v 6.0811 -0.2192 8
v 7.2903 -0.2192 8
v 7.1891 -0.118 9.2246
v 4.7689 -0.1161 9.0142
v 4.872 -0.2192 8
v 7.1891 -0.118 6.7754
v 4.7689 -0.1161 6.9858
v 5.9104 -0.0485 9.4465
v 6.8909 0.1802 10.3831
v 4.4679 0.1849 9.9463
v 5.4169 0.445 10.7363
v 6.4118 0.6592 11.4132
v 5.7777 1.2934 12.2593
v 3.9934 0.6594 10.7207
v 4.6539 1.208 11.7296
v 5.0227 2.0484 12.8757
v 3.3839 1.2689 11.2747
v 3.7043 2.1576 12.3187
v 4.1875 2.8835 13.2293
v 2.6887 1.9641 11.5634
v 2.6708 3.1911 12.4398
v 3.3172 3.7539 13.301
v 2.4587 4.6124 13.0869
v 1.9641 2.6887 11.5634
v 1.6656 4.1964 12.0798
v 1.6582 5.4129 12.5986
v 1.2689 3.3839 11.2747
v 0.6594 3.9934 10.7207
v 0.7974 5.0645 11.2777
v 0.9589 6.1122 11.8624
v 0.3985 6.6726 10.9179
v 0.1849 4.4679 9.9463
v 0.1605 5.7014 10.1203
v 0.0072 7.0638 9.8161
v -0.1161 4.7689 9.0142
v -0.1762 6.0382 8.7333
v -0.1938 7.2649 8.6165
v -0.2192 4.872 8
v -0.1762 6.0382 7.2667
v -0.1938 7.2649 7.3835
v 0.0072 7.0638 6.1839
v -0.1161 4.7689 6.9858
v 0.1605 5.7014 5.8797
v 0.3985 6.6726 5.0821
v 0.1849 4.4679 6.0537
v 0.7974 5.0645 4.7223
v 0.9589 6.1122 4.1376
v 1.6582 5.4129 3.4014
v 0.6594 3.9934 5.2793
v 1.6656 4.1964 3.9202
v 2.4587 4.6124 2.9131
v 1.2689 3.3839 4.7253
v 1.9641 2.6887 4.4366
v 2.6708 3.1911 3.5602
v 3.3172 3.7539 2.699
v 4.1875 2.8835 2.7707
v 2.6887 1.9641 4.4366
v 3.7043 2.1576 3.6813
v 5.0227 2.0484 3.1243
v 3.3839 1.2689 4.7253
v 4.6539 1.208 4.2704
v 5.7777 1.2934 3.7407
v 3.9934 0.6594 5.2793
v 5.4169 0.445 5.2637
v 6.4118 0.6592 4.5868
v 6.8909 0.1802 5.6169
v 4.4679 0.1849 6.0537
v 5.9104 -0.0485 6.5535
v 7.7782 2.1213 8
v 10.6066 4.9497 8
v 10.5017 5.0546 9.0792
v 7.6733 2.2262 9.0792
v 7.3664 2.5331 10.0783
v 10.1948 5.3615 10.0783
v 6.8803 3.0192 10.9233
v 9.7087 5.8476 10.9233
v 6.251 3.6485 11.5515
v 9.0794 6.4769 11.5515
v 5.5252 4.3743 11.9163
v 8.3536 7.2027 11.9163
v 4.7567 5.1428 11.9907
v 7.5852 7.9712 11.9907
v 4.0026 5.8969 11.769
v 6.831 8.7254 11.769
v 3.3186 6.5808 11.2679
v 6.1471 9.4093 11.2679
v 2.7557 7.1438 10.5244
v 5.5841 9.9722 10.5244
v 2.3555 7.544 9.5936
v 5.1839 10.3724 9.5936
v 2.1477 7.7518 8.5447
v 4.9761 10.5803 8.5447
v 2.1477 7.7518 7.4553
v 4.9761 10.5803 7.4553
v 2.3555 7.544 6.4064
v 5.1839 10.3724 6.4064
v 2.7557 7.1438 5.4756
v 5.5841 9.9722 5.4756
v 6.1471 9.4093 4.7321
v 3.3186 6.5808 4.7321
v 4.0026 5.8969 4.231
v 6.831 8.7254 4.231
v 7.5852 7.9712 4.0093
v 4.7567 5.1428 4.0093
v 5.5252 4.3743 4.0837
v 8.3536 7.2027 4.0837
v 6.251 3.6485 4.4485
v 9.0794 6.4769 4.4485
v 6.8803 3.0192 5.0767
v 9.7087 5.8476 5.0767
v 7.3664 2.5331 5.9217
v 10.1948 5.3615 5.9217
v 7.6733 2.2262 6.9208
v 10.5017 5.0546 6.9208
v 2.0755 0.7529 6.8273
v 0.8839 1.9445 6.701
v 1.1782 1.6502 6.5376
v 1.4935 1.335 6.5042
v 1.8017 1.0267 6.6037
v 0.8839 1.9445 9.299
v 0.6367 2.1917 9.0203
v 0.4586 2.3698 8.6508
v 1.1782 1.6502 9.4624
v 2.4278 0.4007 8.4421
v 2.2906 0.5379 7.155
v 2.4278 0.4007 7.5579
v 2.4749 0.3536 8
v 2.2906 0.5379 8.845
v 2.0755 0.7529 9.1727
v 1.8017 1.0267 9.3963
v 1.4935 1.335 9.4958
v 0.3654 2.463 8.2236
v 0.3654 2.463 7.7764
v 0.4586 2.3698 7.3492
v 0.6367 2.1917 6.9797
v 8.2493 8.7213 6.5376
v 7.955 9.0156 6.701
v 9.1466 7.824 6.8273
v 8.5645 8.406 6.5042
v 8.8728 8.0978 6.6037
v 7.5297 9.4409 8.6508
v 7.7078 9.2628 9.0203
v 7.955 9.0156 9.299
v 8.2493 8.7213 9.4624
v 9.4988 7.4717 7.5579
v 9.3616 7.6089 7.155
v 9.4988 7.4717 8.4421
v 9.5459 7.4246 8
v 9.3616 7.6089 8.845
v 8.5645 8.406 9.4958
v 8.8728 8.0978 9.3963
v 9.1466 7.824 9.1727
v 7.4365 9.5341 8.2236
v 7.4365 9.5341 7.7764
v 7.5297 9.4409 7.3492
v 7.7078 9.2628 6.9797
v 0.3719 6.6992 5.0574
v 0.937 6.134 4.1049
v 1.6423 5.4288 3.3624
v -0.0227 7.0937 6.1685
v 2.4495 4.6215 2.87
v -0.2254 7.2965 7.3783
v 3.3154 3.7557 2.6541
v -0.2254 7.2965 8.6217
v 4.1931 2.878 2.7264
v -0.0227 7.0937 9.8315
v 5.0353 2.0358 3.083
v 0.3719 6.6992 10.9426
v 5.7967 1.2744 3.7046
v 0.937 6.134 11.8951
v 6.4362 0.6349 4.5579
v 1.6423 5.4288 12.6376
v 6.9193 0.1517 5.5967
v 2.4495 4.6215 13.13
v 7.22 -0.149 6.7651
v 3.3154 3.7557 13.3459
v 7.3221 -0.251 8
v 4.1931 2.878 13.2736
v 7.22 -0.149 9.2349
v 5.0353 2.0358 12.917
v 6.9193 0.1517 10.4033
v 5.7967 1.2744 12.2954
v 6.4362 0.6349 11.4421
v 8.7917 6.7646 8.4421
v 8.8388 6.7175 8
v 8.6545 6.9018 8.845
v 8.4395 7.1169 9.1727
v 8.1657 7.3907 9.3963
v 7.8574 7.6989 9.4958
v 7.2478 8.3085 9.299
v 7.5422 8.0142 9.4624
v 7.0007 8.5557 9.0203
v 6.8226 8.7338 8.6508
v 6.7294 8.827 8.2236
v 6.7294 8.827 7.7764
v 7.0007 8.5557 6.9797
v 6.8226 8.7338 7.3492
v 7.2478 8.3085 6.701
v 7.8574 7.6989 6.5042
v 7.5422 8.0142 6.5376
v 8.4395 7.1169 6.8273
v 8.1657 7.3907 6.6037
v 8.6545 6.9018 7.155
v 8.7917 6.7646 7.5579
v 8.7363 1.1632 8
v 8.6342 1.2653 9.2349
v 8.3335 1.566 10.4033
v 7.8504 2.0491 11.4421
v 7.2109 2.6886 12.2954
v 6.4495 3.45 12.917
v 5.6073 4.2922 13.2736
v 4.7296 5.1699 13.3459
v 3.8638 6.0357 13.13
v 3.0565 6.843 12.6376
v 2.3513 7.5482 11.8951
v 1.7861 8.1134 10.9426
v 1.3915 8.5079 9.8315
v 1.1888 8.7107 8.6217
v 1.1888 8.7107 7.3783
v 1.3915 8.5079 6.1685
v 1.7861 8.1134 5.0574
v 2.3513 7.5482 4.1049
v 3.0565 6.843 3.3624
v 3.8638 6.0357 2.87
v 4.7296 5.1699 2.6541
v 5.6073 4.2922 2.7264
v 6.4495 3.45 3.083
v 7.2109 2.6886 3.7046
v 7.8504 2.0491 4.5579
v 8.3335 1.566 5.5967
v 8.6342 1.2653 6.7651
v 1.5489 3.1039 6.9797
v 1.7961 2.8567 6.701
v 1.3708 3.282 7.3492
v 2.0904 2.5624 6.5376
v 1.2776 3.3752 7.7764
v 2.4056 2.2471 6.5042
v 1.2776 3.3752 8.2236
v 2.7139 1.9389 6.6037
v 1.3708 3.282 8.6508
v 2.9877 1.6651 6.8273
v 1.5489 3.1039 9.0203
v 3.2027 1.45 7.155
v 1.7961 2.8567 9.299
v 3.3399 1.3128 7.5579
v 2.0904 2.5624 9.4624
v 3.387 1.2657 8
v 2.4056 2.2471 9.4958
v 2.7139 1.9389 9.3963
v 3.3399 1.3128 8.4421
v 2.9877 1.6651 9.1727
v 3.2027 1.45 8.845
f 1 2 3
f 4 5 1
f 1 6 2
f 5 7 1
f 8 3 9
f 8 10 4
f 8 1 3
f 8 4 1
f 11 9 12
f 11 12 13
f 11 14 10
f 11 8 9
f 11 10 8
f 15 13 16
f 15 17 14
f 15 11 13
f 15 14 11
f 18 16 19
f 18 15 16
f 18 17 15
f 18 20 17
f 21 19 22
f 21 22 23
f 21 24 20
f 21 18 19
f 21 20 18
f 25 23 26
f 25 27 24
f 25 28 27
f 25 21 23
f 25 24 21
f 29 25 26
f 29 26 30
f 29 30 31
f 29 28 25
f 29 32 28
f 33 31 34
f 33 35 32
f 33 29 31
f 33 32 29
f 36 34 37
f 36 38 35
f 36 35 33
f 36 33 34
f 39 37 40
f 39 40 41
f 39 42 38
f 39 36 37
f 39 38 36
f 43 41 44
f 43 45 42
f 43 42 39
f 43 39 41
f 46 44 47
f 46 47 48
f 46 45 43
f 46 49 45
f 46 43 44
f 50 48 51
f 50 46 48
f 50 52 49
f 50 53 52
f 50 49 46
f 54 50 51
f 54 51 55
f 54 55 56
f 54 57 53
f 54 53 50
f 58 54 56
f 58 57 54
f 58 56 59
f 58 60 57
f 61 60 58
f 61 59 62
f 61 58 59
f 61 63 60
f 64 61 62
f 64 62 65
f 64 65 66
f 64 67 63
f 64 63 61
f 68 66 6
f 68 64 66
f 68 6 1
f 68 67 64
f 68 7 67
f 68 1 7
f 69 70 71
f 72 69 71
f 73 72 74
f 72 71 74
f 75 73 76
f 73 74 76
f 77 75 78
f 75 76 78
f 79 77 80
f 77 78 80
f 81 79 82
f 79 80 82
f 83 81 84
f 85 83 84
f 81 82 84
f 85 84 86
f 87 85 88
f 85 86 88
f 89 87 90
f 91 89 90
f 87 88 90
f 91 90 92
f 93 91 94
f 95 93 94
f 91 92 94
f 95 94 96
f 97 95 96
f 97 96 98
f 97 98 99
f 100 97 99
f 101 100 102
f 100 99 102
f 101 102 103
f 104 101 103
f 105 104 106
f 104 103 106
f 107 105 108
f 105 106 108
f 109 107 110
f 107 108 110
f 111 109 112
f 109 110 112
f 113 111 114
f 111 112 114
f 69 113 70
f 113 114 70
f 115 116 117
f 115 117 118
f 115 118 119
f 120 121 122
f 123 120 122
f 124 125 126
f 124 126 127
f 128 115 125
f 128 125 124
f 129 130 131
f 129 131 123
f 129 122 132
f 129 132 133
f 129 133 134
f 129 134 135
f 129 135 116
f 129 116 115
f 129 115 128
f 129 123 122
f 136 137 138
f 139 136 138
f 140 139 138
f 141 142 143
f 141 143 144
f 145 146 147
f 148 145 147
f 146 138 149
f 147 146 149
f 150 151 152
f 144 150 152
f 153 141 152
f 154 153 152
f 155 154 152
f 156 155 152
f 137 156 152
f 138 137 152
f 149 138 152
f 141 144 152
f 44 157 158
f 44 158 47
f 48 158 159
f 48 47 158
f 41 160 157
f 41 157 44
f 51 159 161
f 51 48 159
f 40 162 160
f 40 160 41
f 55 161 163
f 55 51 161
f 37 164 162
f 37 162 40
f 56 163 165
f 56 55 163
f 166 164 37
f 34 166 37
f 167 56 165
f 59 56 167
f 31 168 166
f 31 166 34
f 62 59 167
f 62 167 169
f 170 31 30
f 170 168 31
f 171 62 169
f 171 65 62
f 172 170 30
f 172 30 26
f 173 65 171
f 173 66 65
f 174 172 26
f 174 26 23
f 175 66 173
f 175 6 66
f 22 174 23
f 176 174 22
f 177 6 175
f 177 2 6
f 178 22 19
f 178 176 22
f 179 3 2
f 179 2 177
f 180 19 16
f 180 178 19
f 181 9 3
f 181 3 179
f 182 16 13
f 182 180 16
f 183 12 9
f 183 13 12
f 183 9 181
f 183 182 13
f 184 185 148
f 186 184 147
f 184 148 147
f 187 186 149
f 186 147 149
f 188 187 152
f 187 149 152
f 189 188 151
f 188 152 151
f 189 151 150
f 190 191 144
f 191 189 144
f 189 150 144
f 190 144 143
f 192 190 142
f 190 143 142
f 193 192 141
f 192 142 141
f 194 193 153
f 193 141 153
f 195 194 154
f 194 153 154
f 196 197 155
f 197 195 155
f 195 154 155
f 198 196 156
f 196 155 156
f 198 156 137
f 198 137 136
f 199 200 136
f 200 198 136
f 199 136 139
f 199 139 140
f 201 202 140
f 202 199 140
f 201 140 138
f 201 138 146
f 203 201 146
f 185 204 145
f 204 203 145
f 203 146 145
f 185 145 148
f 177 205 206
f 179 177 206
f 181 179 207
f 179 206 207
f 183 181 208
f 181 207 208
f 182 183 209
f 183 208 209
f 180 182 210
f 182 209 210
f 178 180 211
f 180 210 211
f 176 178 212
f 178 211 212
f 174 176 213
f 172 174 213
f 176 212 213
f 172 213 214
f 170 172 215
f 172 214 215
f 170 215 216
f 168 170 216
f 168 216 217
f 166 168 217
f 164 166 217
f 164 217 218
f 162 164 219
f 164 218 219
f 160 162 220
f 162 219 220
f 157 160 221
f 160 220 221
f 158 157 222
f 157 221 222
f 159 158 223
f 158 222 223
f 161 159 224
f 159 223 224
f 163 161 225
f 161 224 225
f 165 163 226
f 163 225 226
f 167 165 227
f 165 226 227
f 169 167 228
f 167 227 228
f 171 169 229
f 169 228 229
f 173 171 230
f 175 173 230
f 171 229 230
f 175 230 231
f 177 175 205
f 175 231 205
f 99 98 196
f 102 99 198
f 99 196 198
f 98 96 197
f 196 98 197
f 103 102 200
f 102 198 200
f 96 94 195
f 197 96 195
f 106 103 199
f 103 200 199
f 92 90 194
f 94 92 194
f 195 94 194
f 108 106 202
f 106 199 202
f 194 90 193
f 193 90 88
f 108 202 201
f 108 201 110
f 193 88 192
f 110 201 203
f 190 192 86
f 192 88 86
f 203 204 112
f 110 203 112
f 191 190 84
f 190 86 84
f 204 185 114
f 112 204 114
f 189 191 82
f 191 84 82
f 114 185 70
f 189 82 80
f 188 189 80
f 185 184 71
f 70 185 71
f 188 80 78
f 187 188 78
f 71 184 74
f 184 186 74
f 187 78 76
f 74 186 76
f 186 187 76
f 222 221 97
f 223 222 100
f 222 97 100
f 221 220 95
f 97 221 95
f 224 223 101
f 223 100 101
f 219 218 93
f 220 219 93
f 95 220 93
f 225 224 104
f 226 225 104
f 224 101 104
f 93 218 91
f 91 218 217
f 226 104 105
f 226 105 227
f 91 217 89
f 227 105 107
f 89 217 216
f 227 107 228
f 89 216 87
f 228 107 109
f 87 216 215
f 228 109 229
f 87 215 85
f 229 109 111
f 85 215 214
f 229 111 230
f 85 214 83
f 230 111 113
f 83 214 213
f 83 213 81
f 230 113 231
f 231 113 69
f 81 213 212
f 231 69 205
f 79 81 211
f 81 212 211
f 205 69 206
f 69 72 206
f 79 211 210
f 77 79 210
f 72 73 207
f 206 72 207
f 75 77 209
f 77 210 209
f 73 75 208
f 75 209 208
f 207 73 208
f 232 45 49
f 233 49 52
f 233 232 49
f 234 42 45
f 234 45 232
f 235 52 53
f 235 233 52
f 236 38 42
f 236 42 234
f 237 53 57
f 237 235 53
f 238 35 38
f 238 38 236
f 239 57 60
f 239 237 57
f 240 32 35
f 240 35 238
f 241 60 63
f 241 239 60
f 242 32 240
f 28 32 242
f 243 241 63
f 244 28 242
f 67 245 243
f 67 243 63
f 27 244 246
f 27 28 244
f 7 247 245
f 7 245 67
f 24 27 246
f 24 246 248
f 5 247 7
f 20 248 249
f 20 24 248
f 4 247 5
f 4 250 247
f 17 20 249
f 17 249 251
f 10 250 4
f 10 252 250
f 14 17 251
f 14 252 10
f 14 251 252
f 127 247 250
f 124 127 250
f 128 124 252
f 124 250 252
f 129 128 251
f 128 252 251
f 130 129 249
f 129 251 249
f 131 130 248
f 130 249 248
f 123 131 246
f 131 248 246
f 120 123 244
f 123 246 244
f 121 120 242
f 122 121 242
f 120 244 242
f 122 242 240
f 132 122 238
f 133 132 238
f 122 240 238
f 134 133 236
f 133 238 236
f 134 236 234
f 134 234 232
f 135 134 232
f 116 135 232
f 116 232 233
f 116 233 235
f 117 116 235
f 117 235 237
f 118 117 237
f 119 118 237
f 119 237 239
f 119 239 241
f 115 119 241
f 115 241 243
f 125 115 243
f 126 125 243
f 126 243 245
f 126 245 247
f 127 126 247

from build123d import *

# Parameters (mm, degrees)
CYLINDER081016_R                               = 1.5
CYLINDER081016_DEPTH                           = 10
CYLINDER081017_R                               = 4
CYLINDER081017_DEPTH                           = 4
CYLINDER081018_R                               = 5.355
CYLINDER081018_DEPTH                           = 2
FUSION103077013004017008011030_PLACEMENT_ANGLE = 45


with BuildPart() as cylinder081013:
    # Cylinder081016 → Cylinder081016 (new body)
    with BuildSketch(Plane(origin=(0, 12, 8), x_dir=(1, 0, 0), z_dir=(0, -1, 0))):
        Circle(CYLINDER081016_R)
    extrude(amount=CYLINDER081016_DEPTH)


with BuildPart() as cylinder081014:
    # Cylinder081017 → Cylinder081017 (new body)
    with BuildSketch(Plane(origin=(0, 11, 8), x_dir=(1, 0, 0), z_dir=(0, -1, 0))):
        Circle(CYLINDER081017_R)
    extrude(amount=CYLINDER081017_DEPTH)


with BuildPart() as cylinder081015:
    # Cylinder081018 → Cylinder081018 (new body)
    with BuildSketch(Plane(origin=(0, 7, 8), x_dir=(1, 0, 0), z_dir=(0, -1, 0))):
        Circle(CYLINDER081018_R)
    extrude(amount=CYLINDER081018_DEPTH)


with BuildPart() as commercial_gear:
    # Cone004 → Cone004 (revolve)
    with BuildSketch(Plane(origin=(0, 5, 8), x_dir=(1, 0, 0), z_dir=(0, 0, -1))):
        Polygon((0, 0), (5.31, 0), (3.6, 1.71), (0, 1.71), align=None)
    revolve(axis=Axis((0, 5, 8), (0, -1, 0)))

    # Fusion103077013004017008011030: union Cylinder081013, Cylinder081014, Cylinder081015
    add(cylinder081013.part)
    add(cylinder081014.part)
    add(cylinder081015.part)


with BuildPart() as commercial_gear_1:
    # Fusion103077013004017008011030 placement: moved
    add(commercial_gear.part.rotate(Axis((0, 0, 0), (0, 0, -1)), FUSION103077013004017008011030_PLACEMENT_ANGLE))


solid = commercial_gear_1.part
